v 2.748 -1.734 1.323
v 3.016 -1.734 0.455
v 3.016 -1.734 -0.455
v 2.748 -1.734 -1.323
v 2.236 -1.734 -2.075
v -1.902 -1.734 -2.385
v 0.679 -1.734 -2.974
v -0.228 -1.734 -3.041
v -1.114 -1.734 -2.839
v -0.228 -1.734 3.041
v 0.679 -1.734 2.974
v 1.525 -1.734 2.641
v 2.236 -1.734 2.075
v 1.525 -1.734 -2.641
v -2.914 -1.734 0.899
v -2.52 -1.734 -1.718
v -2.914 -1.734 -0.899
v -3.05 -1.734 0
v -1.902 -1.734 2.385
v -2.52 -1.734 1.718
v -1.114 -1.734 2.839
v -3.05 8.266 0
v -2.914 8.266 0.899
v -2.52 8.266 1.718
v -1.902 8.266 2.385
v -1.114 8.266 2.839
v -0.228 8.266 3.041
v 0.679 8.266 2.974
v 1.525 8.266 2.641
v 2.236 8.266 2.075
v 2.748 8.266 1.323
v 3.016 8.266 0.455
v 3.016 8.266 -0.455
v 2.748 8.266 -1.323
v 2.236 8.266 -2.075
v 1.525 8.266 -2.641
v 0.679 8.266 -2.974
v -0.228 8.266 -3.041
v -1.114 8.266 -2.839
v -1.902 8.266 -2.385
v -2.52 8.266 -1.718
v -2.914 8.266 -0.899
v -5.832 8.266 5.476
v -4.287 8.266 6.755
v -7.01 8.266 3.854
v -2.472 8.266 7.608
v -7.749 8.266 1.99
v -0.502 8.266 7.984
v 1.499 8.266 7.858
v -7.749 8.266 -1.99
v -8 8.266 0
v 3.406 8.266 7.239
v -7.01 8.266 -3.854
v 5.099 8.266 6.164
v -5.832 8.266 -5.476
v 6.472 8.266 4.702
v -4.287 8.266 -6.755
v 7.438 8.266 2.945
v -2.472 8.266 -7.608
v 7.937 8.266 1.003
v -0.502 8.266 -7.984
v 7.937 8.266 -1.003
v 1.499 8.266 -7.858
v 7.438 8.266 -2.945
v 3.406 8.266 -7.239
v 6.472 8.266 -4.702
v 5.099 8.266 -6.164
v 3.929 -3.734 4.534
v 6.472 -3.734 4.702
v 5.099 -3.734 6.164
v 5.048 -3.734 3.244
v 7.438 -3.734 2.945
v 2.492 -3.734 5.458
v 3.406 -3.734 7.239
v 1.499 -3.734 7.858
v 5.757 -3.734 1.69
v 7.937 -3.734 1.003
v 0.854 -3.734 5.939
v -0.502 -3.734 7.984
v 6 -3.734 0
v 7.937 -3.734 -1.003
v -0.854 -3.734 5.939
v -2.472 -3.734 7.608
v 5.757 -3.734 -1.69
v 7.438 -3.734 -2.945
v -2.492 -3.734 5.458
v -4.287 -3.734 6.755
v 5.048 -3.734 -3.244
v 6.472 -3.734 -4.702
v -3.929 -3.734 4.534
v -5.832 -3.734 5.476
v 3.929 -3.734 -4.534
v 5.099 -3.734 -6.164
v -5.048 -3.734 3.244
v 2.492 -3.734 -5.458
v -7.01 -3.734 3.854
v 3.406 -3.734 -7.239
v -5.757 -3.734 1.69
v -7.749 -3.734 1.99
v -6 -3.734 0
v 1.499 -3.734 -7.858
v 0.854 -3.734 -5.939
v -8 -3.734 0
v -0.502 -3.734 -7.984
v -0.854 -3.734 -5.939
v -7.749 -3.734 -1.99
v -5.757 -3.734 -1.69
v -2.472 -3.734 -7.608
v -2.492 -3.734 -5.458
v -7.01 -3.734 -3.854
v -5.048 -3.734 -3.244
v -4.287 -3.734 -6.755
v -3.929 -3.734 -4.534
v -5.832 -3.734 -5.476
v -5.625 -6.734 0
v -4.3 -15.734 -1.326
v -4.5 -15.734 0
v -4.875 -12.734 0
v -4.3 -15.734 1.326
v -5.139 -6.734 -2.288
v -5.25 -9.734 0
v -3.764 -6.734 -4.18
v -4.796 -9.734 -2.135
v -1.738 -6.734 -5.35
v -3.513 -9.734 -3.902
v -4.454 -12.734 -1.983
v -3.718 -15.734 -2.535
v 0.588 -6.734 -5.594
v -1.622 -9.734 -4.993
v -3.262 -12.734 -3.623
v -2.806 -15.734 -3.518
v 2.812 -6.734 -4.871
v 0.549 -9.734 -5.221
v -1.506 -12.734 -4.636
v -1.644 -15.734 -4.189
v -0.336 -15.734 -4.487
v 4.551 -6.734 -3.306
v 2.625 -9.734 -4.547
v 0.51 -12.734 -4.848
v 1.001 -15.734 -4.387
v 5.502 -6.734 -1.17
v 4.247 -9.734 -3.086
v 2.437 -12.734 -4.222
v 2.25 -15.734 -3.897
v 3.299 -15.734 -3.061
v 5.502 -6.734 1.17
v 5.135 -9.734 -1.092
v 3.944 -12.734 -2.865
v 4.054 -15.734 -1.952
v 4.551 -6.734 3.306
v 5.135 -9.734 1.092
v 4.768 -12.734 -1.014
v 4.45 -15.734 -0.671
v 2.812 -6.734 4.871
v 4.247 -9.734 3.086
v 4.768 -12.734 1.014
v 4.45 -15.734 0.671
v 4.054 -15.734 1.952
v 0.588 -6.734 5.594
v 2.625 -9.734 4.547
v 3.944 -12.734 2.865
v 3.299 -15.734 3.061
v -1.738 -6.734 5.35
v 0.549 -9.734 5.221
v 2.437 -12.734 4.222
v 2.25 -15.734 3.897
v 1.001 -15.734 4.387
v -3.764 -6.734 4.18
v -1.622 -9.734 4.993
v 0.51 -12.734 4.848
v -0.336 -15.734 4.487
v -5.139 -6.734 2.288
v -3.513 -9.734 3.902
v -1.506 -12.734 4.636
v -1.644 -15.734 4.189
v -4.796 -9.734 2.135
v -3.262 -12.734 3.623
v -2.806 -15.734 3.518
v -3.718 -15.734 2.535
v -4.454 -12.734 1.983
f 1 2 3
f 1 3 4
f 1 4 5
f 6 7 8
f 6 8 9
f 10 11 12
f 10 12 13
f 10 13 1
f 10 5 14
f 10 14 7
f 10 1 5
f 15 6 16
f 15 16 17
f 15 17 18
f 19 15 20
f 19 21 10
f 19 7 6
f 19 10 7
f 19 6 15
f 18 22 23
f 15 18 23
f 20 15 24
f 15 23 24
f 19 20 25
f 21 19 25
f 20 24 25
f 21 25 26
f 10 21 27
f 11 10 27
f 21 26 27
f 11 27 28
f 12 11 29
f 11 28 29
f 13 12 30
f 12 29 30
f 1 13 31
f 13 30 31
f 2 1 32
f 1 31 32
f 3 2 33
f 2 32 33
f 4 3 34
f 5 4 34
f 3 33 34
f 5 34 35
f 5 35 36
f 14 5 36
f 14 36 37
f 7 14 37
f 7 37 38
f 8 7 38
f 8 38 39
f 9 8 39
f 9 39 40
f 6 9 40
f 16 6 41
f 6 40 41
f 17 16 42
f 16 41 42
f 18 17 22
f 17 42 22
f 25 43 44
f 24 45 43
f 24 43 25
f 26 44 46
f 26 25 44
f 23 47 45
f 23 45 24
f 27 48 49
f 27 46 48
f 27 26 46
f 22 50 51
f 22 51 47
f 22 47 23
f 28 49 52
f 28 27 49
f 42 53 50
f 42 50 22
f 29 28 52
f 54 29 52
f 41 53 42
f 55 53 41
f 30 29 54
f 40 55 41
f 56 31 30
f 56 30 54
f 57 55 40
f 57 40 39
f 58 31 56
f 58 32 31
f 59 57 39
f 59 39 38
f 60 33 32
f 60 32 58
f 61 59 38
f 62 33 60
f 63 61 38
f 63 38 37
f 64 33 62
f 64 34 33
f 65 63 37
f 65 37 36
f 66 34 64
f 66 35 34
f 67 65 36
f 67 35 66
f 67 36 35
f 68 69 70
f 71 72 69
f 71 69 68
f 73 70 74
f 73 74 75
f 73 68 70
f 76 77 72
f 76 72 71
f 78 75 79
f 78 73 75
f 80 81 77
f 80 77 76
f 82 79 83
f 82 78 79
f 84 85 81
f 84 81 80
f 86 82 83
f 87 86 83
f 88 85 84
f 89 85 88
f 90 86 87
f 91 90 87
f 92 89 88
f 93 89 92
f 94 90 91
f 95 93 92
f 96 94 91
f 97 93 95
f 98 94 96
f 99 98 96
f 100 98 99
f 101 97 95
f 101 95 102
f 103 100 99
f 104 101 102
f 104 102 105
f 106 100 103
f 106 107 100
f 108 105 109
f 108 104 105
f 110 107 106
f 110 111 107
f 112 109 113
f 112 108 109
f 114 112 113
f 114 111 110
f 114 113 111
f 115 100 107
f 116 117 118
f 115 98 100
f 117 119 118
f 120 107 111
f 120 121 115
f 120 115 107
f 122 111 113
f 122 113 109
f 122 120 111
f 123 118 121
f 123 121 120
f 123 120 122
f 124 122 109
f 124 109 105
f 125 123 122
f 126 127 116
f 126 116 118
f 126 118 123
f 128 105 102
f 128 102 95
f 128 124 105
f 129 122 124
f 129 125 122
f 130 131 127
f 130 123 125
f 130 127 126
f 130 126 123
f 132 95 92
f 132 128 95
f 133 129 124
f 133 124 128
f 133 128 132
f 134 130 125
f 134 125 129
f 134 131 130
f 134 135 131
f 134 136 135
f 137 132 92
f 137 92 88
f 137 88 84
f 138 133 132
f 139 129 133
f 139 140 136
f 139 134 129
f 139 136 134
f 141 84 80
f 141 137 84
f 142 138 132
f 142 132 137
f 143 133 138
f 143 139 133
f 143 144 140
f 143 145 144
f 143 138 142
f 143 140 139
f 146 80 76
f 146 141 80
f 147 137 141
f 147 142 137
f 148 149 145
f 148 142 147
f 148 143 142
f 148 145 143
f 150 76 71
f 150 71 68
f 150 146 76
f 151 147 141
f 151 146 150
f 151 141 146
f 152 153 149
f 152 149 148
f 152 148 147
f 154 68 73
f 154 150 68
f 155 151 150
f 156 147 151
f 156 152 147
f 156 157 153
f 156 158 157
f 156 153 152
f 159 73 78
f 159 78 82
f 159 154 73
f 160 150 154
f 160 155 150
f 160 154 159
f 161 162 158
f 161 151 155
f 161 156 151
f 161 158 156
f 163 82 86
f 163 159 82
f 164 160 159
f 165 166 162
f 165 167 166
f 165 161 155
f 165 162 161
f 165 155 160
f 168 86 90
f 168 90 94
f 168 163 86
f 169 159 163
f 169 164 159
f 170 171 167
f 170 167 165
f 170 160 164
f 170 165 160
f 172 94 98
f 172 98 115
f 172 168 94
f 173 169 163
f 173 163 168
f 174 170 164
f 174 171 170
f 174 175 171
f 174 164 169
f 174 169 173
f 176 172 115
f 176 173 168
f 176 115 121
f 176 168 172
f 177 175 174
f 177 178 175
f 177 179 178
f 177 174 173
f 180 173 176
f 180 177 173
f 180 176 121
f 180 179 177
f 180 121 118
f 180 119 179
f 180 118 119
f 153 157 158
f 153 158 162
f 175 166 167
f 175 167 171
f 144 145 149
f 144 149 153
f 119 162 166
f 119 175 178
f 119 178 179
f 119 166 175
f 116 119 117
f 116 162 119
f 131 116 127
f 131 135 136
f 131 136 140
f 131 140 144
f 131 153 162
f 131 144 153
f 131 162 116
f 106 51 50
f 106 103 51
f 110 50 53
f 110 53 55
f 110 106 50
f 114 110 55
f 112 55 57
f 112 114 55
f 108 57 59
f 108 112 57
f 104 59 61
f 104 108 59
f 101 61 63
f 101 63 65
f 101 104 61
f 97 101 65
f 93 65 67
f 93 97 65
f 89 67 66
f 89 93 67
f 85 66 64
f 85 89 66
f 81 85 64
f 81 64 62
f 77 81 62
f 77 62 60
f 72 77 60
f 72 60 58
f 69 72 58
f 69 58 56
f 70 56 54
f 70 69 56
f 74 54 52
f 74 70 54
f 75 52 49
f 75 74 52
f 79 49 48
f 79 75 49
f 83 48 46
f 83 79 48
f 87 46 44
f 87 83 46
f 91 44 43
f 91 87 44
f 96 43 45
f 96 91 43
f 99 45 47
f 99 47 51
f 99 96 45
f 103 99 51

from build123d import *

# Parameters (mm, degrees)
CROQUIS2_R            = 3.05
CORTAR_EXTRUIR1_DEPTH = 10


with BuildPart() as part:
    # Croquis1 → Revolución1 (revolve)
    with BuildSketch(Plane.XY, mode=Mode.PRIVATE) as revoluci_n1_sk:
        Polygon((0, 8.266073618), (8, 8.266073618), (8, -3.733926382), (6, -3.733926382), (4.5, -15.733926382), (0, -15.733926382), align=None)
    revolve(revoluci_n1_sk.sketch.rotate(Axis((0, 12.501582414, 0), (0, -1, 0)), 180), axis=Axis((0, 12.501582414, 0), (0, -1, 0)))

    # Croquis2 → Cortar-Extruir1 (cut)
    with BuildSketch(Plane(origin=(0, 8.266073618, 0), x_dir=(1, 0, 0), z_dir=(0, 1, 0))):
        with Locations(Location((0, 0, 0), (0, 0, 180))):
            Circle(CROQUIS2_R)
    extrude(amount=-CORTAR_EXTRUIR1_DEPTH, mode=Mode.SUBTRACT)


solid = part.part
